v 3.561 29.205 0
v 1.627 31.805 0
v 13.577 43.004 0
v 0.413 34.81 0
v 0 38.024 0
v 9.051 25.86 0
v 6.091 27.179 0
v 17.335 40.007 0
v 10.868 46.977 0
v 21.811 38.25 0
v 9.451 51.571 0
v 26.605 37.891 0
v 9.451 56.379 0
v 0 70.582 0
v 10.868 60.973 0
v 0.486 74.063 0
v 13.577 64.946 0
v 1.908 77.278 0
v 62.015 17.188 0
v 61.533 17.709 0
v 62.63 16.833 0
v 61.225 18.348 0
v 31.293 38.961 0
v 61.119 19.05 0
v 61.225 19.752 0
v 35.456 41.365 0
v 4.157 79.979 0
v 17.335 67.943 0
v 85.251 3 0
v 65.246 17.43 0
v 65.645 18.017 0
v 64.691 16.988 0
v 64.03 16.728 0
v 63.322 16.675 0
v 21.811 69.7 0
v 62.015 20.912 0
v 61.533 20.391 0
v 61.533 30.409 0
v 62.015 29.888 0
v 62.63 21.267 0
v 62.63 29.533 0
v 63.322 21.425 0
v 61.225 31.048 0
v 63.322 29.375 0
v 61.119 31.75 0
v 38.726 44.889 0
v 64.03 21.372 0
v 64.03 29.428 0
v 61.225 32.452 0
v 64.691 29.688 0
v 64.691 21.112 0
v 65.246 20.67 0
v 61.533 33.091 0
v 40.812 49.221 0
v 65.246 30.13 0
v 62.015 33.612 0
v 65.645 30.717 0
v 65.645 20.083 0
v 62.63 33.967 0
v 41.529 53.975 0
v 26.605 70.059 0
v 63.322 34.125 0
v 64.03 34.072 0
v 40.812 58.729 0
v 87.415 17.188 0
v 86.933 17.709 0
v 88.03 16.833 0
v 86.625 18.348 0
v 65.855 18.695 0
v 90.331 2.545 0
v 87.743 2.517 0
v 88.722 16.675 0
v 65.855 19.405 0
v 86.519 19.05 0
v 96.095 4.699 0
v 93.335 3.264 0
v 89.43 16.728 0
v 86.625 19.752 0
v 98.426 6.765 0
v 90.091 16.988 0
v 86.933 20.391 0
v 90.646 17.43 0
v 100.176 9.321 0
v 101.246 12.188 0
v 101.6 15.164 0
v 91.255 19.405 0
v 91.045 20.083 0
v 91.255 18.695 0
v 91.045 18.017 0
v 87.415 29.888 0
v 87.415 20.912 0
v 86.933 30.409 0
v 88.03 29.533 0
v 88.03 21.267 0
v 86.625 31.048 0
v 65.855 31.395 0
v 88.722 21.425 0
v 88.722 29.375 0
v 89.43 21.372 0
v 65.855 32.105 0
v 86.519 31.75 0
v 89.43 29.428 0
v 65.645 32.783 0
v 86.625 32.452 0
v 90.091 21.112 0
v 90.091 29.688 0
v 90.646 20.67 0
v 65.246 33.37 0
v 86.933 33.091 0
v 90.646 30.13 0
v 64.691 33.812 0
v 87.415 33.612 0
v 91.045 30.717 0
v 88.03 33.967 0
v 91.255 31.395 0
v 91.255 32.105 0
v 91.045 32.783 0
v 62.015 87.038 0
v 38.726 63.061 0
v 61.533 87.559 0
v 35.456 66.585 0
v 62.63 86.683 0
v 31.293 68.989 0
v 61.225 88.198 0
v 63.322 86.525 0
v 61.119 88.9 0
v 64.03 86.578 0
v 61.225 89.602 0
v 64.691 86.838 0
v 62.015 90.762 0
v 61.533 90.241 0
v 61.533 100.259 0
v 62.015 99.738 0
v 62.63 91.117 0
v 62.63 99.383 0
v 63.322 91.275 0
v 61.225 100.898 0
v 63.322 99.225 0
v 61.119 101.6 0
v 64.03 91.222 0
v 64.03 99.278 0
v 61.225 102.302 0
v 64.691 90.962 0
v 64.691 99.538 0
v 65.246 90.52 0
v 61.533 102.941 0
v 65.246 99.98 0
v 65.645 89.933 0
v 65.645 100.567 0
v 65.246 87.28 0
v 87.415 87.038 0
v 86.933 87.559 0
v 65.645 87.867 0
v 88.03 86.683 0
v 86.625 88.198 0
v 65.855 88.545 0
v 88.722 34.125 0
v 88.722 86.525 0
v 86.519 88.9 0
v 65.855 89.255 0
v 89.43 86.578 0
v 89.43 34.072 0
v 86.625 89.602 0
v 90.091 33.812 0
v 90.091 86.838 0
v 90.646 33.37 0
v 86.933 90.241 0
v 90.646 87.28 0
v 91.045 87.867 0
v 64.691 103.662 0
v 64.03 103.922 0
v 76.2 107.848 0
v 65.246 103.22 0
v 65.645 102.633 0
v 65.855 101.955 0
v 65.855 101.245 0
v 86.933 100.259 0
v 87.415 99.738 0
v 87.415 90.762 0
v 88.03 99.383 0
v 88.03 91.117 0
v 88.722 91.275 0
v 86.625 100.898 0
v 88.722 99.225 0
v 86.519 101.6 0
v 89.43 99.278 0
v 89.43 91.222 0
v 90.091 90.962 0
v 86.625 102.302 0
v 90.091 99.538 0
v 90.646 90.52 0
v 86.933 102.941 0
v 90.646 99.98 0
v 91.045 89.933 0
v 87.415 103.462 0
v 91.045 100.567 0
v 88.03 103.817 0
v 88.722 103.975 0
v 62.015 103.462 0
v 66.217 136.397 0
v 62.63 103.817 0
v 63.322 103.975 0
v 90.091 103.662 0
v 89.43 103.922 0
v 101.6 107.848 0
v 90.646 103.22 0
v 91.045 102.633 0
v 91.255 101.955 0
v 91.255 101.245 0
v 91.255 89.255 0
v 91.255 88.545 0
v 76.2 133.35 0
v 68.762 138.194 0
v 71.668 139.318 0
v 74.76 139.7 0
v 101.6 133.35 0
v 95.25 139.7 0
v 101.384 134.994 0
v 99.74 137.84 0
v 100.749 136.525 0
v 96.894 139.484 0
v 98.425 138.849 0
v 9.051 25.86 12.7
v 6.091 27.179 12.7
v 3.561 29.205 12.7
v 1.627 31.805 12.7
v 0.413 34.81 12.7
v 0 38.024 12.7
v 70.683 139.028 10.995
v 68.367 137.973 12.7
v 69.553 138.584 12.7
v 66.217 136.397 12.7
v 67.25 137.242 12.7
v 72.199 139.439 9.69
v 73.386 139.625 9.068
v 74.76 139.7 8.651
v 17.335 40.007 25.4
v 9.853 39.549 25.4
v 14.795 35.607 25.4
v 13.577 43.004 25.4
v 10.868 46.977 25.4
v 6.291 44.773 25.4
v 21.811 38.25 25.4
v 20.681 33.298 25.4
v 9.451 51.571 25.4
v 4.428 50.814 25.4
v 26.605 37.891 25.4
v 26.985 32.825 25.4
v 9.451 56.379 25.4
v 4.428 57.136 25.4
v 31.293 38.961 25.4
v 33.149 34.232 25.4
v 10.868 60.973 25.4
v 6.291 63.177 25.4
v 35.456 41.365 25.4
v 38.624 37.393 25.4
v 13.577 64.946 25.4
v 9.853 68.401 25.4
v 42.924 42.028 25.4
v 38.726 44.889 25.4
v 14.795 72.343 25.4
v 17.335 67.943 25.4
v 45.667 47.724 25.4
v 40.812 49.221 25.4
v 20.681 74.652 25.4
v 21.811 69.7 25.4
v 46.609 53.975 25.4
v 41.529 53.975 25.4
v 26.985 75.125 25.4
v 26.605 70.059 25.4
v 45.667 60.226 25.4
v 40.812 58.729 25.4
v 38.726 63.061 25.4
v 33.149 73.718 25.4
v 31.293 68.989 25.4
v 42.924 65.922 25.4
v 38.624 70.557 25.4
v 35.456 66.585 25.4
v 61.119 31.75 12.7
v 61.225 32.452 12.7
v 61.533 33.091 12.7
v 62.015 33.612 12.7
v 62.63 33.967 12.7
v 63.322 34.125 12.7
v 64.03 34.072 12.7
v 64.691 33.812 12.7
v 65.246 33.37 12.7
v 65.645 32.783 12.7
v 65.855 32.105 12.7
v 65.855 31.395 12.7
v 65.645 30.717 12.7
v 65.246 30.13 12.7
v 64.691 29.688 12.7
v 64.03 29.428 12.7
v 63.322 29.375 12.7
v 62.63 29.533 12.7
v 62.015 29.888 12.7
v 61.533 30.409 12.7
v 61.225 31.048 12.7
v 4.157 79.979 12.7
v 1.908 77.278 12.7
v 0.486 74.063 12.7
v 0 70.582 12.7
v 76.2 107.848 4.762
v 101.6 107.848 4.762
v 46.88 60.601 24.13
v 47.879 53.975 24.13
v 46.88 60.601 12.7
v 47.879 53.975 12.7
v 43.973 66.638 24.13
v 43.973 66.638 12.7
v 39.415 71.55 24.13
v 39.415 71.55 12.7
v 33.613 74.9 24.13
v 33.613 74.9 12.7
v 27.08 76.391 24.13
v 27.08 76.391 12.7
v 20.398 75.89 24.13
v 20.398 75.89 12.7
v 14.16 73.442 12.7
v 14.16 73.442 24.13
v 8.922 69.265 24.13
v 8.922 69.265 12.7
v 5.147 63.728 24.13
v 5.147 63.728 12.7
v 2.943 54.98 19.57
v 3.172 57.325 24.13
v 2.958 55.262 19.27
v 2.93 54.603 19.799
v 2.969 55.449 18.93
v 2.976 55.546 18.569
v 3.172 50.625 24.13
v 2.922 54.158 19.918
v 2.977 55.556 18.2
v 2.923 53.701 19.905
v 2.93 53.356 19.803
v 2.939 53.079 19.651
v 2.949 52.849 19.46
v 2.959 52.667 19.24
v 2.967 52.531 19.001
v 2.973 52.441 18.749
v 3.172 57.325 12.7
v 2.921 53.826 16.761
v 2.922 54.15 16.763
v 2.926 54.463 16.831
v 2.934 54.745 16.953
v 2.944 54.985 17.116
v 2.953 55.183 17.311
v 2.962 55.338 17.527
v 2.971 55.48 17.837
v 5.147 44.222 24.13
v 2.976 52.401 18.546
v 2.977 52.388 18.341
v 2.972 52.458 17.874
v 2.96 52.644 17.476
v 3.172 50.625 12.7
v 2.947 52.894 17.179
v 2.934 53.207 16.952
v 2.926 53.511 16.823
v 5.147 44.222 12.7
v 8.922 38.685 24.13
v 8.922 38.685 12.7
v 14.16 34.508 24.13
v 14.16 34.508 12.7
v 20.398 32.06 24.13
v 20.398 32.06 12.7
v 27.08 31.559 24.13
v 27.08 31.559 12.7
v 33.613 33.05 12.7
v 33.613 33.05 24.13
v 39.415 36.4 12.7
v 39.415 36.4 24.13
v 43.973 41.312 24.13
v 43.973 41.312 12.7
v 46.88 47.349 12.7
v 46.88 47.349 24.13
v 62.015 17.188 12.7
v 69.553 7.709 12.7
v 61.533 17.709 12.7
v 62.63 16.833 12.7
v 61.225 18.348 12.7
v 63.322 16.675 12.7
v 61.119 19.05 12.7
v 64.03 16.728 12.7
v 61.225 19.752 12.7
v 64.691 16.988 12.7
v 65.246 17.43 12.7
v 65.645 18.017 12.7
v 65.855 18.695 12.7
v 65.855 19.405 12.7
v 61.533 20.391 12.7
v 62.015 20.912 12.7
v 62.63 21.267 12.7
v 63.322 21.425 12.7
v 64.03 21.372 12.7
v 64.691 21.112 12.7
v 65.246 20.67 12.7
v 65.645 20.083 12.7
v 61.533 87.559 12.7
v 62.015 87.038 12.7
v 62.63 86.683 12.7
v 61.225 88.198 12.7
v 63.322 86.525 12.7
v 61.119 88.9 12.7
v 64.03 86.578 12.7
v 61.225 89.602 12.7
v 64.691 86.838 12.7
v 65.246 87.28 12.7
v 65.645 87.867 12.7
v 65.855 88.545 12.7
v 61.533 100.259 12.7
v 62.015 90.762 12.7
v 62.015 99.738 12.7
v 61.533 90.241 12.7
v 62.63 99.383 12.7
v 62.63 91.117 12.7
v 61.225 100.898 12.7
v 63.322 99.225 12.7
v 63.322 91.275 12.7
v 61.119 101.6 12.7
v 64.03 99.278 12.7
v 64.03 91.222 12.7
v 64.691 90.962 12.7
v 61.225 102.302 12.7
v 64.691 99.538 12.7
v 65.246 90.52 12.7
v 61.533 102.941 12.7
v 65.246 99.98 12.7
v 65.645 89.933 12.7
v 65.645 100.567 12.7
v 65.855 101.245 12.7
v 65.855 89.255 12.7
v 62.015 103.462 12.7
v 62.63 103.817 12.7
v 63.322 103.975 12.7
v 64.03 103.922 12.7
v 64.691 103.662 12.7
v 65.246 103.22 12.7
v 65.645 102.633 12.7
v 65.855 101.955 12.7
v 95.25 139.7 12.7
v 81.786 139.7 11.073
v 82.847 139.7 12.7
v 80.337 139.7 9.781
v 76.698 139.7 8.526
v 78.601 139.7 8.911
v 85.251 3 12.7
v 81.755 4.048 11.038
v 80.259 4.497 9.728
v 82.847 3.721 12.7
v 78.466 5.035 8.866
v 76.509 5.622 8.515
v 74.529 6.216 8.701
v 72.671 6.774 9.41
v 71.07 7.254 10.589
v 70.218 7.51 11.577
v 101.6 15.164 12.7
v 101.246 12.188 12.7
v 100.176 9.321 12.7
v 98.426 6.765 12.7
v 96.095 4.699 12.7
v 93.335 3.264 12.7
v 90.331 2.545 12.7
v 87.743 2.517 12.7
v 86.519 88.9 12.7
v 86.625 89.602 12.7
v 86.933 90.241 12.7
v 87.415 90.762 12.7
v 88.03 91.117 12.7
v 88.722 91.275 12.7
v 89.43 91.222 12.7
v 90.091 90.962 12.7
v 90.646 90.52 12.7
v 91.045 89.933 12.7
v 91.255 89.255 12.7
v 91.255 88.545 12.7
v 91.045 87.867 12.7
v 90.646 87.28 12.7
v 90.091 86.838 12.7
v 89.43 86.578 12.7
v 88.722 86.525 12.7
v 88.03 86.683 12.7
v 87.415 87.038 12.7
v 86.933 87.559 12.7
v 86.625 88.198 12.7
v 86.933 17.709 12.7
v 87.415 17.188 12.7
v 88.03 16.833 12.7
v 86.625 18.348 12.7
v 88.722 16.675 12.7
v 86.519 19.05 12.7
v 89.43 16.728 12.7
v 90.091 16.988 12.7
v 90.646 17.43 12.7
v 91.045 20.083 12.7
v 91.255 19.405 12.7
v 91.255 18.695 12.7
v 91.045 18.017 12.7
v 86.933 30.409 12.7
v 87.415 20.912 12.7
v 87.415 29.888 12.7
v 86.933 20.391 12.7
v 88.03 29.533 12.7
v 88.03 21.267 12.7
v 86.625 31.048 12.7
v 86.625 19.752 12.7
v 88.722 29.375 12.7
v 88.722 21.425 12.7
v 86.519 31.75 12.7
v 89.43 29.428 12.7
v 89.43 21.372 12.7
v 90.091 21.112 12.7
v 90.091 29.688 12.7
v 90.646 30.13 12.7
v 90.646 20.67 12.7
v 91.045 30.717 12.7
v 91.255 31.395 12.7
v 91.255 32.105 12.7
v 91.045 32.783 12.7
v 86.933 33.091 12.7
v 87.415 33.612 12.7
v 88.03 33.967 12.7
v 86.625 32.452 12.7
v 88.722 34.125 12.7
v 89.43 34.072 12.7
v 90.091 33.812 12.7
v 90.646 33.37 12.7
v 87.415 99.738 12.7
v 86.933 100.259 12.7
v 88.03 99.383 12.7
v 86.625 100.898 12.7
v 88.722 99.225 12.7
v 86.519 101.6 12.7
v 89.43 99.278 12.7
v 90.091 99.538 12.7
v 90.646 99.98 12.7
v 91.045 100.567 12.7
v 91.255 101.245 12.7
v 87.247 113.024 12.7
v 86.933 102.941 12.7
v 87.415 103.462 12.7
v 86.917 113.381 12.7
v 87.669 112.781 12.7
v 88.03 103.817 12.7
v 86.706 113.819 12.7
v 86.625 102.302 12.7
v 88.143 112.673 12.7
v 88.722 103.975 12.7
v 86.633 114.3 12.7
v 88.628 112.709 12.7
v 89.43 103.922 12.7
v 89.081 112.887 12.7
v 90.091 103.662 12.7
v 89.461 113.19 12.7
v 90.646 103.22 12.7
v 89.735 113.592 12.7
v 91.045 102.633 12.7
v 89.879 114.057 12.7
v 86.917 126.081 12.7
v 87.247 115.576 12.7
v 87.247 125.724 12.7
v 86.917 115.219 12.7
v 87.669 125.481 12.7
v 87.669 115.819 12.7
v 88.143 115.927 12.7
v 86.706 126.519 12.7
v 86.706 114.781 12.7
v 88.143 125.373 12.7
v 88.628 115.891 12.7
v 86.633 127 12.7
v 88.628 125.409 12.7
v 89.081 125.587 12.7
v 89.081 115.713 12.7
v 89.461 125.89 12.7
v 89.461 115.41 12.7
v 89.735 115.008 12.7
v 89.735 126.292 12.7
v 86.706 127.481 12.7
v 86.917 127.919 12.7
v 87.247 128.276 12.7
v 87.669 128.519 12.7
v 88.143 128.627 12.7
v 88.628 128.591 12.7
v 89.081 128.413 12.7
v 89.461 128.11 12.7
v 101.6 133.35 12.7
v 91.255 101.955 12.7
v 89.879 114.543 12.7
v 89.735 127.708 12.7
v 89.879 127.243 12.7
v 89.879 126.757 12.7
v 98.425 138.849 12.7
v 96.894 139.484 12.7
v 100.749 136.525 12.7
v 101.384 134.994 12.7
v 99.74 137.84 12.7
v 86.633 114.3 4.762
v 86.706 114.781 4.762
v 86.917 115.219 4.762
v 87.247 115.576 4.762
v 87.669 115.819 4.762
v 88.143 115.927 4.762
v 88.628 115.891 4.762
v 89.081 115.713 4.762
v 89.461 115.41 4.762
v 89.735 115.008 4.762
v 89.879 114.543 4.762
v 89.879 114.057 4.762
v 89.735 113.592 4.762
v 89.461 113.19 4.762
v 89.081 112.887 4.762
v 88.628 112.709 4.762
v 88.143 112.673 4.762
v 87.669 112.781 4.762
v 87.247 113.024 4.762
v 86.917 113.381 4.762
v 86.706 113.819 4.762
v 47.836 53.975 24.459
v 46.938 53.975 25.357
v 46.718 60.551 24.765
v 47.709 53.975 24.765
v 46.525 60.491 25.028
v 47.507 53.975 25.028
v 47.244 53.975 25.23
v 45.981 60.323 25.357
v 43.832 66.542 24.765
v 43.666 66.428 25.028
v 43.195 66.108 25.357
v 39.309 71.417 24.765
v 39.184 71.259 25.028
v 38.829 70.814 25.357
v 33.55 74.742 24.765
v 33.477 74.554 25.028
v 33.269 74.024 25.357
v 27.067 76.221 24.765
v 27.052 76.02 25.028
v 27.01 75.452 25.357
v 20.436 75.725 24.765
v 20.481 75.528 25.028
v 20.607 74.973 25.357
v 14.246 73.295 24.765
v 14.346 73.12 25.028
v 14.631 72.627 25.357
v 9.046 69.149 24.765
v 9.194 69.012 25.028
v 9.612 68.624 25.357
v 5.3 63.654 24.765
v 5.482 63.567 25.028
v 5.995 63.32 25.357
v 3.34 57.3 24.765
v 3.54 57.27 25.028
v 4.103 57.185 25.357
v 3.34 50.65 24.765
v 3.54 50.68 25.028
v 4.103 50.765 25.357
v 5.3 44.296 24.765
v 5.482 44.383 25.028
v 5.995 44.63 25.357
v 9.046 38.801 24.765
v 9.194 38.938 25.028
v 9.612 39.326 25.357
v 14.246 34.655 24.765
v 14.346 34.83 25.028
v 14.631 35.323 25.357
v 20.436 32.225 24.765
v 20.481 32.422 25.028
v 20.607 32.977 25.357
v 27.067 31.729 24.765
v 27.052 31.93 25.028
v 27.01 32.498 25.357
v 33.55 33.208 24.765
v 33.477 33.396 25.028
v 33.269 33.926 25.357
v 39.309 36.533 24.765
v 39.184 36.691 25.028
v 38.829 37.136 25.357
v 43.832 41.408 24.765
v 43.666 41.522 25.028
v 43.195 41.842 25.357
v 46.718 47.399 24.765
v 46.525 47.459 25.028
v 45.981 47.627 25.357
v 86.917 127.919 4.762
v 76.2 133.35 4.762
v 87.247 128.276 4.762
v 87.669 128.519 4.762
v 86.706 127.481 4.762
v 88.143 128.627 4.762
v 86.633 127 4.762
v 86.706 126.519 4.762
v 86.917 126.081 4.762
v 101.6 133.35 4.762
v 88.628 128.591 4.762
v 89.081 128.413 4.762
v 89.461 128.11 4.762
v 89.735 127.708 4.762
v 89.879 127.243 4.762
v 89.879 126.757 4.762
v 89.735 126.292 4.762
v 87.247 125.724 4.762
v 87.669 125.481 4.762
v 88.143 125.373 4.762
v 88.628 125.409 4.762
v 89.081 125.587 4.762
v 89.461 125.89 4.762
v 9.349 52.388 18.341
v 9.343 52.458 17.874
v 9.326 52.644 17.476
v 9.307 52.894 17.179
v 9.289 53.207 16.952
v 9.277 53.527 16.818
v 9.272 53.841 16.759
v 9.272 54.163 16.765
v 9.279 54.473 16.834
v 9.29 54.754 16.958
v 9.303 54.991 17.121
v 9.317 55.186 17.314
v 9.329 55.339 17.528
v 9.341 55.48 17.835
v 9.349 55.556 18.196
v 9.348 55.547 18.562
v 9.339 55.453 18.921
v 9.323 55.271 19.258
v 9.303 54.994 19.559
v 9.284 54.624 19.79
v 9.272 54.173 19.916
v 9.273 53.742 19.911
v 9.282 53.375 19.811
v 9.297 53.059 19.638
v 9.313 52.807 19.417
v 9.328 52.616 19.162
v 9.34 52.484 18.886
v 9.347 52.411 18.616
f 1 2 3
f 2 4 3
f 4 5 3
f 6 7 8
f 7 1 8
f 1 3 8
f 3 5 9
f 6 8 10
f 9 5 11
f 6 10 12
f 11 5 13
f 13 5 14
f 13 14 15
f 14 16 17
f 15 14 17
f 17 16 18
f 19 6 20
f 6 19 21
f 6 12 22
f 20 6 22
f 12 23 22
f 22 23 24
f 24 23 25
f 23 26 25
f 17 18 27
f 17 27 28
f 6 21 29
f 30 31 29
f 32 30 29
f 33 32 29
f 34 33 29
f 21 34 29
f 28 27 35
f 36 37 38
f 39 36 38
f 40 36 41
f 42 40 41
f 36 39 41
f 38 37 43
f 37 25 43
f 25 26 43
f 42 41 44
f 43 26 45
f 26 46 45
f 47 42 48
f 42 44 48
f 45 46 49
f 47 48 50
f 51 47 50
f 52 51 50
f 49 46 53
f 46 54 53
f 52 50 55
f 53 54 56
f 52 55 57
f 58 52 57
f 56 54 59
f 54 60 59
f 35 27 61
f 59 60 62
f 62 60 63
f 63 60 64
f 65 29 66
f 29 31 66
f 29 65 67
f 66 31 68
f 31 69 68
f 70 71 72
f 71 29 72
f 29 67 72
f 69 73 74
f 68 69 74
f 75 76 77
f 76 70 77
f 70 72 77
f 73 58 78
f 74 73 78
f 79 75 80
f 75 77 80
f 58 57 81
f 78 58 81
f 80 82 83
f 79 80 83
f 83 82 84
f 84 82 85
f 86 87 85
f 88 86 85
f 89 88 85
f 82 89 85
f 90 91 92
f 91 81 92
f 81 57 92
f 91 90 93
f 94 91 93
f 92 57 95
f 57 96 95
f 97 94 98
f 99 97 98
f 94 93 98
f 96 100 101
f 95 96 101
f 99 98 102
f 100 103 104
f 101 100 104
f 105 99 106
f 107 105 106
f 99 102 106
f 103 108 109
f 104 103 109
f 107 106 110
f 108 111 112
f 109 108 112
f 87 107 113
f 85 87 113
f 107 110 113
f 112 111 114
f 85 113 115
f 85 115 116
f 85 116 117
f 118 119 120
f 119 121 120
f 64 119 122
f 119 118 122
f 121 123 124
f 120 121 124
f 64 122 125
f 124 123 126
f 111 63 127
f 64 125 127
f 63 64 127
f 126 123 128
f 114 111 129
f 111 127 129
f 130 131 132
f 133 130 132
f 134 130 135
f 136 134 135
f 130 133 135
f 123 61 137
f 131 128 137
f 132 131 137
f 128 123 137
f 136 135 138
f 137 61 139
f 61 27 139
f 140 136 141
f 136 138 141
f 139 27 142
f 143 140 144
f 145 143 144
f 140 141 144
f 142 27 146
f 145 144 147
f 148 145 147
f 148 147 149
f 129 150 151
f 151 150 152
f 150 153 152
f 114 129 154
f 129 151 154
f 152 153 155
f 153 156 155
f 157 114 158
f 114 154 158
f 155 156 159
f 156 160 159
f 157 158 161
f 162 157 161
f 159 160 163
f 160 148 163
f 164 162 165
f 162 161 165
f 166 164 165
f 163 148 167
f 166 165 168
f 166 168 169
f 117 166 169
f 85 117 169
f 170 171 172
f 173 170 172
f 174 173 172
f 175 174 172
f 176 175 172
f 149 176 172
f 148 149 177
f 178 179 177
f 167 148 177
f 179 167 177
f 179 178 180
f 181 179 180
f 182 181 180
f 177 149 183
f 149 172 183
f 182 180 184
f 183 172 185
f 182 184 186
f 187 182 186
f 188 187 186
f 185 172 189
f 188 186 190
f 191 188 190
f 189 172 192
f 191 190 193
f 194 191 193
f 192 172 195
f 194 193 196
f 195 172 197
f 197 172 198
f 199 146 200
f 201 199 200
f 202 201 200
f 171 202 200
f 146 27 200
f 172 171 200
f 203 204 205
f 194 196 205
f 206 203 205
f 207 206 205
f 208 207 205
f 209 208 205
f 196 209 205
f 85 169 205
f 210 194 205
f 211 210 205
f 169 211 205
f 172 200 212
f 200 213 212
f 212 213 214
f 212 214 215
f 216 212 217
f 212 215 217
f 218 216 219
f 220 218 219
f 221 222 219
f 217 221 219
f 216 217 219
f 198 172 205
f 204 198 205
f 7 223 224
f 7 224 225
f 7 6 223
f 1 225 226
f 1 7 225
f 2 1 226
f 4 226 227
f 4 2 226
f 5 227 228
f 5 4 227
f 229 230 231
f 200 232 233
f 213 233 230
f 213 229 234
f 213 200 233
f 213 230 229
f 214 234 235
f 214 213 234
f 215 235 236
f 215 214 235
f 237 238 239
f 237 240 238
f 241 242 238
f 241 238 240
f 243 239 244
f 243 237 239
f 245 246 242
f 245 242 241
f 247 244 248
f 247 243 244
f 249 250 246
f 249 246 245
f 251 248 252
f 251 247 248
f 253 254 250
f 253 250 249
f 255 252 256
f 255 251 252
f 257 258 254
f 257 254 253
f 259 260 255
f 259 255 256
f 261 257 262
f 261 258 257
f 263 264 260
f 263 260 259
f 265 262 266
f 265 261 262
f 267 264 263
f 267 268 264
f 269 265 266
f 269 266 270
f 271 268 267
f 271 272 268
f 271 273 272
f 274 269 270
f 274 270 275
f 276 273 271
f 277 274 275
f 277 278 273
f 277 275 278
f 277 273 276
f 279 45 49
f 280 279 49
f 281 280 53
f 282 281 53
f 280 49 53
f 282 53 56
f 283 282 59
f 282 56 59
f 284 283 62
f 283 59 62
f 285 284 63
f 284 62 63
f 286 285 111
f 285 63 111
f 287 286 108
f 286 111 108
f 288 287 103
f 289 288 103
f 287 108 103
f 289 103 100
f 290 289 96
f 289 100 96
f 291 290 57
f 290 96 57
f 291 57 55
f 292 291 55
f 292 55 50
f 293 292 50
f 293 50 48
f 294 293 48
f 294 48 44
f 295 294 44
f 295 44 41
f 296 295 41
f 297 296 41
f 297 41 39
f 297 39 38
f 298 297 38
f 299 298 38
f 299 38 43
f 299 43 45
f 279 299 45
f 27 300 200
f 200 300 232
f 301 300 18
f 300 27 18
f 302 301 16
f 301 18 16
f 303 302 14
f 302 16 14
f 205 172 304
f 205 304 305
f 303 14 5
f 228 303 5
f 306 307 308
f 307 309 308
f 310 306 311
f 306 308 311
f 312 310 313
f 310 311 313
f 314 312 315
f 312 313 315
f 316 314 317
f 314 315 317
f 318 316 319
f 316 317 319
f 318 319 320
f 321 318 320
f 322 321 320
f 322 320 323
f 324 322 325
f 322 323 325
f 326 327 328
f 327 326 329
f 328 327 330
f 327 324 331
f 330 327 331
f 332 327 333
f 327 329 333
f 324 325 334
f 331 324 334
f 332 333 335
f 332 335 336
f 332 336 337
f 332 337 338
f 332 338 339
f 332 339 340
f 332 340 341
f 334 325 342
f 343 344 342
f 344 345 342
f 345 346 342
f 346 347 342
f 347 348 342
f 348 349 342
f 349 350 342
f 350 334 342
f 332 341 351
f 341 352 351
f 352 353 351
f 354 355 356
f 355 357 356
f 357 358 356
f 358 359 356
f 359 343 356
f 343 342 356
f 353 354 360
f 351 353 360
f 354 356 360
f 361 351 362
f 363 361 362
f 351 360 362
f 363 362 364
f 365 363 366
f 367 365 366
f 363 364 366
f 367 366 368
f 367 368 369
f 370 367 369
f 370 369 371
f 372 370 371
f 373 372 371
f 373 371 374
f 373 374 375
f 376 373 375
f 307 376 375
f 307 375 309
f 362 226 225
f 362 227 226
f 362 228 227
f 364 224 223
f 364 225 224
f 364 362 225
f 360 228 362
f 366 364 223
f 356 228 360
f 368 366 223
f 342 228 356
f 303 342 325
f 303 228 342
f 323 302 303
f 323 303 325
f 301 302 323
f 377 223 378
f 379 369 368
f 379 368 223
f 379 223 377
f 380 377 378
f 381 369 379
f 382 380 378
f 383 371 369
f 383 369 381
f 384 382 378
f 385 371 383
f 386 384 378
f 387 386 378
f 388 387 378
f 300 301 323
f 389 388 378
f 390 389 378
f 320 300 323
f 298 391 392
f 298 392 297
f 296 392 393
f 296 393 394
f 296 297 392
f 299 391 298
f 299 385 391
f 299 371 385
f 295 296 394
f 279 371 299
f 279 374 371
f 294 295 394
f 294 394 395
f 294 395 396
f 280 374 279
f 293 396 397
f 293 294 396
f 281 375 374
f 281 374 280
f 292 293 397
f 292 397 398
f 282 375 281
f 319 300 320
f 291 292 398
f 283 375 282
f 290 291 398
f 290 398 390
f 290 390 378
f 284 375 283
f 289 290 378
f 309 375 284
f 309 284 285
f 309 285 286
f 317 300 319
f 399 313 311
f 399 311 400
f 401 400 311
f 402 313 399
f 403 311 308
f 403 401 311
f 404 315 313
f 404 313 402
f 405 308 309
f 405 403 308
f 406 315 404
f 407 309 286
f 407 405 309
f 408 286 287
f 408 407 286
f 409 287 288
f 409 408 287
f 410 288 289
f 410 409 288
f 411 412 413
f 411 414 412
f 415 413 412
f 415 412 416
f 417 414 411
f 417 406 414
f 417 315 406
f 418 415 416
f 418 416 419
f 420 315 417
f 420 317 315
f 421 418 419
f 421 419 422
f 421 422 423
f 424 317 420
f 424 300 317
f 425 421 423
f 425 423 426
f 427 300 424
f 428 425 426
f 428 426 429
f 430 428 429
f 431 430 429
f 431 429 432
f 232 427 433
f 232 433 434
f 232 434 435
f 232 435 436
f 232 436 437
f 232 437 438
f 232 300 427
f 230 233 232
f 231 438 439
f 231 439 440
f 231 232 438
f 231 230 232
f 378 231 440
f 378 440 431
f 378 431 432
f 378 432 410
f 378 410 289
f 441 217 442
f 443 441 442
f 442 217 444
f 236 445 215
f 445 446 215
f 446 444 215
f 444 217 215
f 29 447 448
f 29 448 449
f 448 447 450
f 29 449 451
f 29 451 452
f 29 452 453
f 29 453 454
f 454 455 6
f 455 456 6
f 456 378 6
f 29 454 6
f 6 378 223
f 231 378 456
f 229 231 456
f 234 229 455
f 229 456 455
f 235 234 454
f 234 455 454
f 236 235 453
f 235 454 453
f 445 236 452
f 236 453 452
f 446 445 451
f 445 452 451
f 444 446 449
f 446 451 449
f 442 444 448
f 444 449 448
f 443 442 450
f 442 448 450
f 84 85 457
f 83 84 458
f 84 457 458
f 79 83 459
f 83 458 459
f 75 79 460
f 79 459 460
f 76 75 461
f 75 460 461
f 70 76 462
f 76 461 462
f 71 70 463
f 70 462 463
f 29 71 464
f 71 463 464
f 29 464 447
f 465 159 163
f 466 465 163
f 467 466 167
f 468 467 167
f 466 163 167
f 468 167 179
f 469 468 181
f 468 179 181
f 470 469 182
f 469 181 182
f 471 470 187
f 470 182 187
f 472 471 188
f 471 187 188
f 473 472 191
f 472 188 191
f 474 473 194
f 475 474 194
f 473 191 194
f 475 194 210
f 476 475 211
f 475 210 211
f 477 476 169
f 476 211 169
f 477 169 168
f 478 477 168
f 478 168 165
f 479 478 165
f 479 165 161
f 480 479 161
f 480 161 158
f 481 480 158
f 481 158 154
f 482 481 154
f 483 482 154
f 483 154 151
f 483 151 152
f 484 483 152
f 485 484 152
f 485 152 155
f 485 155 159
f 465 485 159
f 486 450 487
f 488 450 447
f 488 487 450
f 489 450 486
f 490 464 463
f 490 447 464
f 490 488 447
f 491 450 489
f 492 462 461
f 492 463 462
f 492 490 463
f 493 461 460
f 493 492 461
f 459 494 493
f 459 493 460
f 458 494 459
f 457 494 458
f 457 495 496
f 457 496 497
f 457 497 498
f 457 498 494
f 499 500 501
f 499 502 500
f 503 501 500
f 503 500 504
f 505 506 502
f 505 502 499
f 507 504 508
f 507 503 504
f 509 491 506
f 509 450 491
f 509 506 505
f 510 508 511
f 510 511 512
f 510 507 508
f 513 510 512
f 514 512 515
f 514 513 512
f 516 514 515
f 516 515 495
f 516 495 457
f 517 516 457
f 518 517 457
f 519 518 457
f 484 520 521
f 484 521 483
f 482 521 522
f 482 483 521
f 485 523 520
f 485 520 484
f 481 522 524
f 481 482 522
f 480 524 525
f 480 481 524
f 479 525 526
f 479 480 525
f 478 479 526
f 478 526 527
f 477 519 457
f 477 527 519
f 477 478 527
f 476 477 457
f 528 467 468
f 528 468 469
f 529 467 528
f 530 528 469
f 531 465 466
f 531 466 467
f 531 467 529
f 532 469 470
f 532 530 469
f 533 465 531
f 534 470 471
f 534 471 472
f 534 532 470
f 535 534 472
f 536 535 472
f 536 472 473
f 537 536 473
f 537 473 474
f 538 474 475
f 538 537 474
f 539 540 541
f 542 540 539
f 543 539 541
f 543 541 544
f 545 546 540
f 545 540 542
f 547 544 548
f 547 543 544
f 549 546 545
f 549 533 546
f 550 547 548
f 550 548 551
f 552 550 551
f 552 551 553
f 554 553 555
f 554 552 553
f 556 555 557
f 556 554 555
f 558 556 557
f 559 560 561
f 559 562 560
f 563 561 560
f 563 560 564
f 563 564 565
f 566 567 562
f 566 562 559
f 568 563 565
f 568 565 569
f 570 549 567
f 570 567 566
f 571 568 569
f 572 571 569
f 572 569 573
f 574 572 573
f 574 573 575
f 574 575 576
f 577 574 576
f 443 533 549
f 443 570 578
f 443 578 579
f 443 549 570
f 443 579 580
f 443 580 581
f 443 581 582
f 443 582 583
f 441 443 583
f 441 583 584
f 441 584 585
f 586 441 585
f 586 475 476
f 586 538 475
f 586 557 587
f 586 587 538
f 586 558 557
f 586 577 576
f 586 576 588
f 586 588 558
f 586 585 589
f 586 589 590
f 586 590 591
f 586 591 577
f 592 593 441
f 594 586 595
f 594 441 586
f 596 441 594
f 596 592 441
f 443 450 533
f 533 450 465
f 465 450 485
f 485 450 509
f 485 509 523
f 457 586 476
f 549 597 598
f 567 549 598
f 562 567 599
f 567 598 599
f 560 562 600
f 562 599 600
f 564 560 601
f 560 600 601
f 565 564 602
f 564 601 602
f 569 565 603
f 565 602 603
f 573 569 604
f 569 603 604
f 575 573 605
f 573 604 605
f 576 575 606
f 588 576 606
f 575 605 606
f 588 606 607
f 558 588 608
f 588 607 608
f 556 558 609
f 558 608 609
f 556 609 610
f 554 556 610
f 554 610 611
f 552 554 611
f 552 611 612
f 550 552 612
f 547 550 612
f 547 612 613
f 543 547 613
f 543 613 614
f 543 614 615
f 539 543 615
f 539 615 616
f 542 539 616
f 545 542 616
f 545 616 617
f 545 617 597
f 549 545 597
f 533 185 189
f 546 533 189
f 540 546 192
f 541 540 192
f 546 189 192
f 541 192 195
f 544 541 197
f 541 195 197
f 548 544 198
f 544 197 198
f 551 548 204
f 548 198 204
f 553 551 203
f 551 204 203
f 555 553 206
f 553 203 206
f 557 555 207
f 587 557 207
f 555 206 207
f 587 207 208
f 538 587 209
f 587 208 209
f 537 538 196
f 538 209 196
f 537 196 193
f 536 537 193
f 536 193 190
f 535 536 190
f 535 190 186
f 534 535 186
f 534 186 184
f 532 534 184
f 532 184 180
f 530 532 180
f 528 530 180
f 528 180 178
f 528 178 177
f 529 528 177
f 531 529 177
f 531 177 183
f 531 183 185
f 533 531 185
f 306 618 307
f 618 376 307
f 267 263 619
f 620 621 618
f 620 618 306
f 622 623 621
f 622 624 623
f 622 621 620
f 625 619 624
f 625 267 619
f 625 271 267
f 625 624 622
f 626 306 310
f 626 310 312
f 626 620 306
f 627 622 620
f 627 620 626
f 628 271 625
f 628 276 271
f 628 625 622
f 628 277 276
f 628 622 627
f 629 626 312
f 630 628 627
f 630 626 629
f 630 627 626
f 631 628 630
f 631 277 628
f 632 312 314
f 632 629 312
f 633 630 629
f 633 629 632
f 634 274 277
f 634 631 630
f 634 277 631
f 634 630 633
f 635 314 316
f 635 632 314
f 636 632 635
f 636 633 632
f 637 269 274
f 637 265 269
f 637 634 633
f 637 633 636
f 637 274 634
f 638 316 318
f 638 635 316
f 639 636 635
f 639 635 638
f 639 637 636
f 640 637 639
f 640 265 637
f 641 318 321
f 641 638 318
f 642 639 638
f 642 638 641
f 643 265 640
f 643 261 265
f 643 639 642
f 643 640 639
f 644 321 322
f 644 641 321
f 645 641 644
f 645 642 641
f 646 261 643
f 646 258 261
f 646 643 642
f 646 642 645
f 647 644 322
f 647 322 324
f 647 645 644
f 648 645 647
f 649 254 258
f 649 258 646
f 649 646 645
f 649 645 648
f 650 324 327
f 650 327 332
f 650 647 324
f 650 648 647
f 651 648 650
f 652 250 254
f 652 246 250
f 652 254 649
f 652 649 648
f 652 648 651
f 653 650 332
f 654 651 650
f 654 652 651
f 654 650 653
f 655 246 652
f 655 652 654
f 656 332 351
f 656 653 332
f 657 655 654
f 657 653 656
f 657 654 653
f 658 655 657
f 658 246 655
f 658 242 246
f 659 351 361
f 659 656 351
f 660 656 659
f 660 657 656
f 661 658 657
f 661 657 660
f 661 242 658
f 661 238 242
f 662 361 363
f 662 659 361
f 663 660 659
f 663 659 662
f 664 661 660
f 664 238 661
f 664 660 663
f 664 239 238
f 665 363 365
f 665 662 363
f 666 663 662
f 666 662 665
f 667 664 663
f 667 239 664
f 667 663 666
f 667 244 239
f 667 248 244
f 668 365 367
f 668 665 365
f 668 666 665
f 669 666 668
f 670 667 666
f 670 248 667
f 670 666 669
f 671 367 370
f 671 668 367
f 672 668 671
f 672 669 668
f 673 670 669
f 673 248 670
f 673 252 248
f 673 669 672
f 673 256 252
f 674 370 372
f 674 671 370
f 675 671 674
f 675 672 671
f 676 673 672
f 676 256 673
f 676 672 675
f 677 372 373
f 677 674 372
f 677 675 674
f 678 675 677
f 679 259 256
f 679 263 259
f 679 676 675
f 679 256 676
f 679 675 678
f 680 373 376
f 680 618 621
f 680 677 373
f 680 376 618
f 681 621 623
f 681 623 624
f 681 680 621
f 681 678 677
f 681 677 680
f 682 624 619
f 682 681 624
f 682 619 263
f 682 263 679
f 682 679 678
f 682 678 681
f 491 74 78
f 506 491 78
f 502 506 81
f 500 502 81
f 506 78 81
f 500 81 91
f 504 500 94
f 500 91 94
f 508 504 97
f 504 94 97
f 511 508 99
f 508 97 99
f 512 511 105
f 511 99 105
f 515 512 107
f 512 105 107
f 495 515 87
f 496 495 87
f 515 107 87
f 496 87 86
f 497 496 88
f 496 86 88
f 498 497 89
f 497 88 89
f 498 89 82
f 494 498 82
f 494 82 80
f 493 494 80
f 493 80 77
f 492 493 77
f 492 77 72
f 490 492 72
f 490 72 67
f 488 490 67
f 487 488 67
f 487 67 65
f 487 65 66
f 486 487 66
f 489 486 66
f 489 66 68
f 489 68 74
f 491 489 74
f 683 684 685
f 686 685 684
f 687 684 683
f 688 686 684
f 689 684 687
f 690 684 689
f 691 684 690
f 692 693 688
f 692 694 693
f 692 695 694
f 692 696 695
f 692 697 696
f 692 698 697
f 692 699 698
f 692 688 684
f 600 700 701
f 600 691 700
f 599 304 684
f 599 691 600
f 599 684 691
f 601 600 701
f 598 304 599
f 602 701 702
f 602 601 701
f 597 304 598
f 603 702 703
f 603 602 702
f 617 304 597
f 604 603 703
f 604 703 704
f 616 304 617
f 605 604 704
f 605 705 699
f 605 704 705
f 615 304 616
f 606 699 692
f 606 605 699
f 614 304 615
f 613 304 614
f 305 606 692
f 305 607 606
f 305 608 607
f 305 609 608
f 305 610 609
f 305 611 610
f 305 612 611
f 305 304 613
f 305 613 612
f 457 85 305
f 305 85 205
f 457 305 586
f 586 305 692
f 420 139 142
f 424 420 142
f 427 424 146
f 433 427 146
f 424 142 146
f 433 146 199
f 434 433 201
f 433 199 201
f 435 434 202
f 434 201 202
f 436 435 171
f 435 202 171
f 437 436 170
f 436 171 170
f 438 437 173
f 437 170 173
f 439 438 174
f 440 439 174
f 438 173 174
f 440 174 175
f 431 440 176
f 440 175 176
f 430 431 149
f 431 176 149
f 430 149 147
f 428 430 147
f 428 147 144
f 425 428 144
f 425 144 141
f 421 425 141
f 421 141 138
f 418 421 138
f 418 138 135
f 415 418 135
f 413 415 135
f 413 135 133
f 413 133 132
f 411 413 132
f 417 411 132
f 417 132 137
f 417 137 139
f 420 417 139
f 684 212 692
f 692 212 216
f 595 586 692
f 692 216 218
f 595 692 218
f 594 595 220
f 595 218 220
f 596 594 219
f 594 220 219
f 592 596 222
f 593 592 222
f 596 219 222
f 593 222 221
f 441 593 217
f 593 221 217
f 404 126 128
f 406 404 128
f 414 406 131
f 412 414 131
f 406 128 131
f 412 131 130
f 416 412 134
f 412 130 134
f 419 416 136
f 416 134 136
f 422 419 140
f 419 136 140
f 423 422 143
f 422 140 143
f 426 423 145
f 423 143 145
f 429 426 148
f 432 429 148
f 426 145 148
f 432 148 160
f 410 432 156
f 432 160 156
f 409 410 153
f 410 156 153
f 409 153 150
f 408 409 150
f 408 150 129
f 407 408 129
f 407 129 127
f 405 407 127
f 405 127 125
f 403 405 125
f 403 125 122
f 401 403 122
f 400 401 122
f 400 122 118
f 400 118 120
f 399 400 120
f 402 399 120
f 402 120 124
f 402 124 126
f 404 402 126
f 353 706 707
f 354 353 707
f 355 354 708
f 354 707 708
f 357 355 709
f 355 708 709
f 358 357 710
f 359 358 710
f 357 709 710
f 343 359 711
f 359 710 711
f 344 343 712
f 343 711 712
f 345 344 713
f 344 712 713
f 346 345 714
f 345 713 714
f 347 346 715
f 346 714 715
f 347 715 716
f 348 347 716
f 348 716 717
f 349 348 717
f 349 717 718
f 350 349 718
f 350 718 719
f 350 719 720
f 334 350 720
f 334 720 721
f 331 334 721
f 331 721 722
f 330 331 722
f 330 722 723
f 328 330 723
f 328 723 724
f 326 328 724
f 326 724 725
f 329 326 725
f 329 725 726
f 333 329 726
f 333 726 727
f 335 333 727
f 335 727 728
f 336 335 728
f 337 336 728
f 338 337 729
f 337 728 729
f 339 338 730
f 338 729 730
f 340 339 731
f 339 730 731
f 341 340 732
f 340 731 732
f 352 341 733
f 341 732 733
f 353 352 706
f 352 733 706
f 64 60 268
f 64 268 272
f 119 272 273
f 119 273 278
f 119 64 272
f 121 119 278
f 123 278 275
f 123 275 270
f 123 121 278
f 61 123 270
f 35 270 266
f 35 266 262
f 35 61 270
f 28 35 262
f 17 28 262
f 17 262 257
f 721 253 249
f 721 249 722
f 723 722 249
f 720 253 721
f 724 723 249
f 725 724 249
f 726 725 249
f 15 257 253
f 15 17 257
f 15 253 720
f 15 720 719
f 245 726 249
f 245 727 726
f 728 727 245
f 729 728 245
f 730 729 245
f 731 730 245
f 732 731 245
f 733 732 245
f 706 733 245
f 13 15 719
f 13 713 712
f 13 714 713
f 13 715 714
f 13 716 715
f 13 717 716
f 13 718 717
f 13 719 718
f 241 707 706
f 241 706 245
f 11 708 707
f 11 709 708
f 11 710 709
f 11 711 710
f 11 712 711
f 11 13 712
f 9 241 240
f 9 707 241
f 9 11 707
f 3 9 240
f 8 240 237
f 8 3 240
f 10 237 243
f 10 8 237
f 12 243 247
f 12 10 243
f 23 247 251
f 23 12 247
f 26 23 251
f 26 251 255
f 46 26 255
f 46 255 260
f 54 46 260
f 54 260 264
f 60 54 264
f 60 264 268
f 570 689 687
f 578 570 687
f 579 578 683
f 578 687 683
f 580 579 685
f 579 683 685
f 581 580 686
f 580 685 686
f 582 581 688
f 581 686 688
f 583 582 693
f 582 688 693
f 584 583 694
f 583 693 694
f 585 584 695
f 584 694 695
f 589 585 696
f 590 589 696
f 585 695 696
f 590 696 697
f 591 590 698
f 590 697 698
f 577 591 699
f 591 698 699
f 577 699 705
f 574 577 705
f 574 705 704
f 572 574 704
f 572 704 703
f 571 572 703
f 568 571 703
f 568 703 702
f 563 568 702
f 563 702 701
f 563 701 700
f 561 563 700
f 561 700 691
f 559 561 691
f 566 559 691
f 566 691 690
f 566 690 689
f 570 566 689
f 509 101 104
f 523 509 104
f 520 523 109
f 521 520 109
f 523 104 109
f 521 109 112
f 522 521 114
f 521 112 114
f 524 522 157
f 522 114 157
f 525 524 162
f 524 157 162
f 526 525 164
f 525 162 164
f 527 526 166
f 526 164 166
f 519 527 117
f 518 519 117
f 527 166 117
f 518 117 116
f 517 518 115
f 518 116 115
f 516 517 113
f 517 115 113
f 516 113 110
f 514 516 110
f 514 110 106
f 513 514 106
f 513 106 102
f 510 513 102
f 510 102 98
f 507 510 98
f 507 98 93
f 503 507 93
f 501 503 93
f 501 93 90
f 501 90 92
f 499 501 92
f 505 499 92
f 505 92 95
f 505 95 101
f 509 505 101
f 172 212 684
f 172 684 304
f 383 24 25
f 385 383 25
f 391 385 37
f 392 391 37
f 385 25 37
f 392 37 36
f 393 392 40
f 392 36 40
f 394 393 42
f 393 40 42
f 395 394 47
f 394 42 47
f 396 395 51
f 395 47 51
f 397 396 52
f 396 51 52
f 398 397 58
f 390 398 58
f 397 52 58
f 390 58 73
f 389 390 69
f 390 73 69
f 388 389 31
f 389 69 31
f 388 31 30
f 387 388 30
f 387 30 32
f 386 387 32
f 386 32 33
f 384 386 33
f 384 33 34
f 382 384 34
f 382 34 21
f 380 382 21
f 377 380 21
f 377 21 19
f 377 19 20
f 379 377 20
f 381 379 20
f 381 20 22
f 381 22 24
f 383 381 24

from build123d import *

# Parameters (mm, degrees)
F0_R      = 16.129
F1_DEPTH  = 12.7
F2_R      = 22.479
F2_R_2    = 16.129
F3_DEPTH  = 12.7
F5_D      = 3.2639
F5_DEPTH  = 19.05
F5_TIP    = 0.9805744872
F7_DEPTH  = 12.7
F8_R      = 12.7
F9_R      = 7.366
F10_DEPTH = 152.4
F11_R     = 1.27
F13_D     = 3.175
F13_DEPTH = 12.7
F13_TIP   = 0.9538662327
F15_D     = 4.7625
F15_DEPTH = 19.05
F15_TIP   = 1.4307993491
F16_W     = 25.4
F16_H     = 25.5016
F17_DEPTH = 4.7625


with BuildPart() as f1:
    # F0 (on Top) → F1 (new body)
    with BuildSketch(Plane.XY):
        with BuildLine():
            Line((0, 133.35), (0, 0))
            Line((0, 0), (95.25, 0))
            ThreePointArc((95.25, 0), (99.7401280605, 1.8598719395), (101.6, 6.35))
            Line((101.6, 6.35), (101.6, 133.35))
            ThreePointArc((101.6, 133.35), (99.7401280605, 137.8401280605), (95.25, 139.7))
            Line((95.25, 139.7), (6.35, 139.7))
            ThreePointArc((6.35, 139.7), (1.8598719395, 137.8401280605), (0, 133.35))
        make_face()
        with Locations((25.4, 53.975)):
            Circle(F0_R, mode=Mode.SUBTRACT)
    extrude(amount=F1_DEPTH)

    # F2 (on face) → F3 (join)
    with BuildSketch(Plane.XY.offset(12.7)):
        with Locations((25.4, 53.975)):
            Circle(F2_R)
        with Locations((25.4, 53.975)):
            Circle(F2_R_2, mode=Mode.SUBTRACT)
    extrude(amount=F3_DEPTH)

    # F5
    with Locations(Plane.XY.offset(12.7)):
        with Locations((88.265, 127), (88.265, 114.3)):
            Hole(F5_D / 2, depth=F5_DEPTH)
            with Locations((0, 0, -(F5_DEPTH + F5_TIP / 2))):  # 118° drill point
                Cone(0, F5_D / 2, F5_TIP, mode=Mode.SUBTRACT)

    # F6 (on face) → F7 (cut, through all)
    with BuildSketch(Plane.XY.offset(12.7)):
        Polygon((95.25, 0), (0, 28.575), (0, 0), align=None)
        Polygon((0, 139.7), (0, 76.2), (69.85, 139.7), align=None)
    extrude(amount=-F7_DEPTH, mode=Mode.SUBTRACT)

    # F8
    f8_edges = [f1.edges().sort_by_distance(p)[0] for p in [
        (0, 28.575, 6.35),
        (0, 76.2, 6.35),
        (69.85, 139.7, 6.35),
        (95.25, 0, 6.35),
    ]]
    fillet(f8_edges, radius=F8_R)

    # F9 (on Front) → F10 (cut)
    with BuildSketch(Plane.XZ):
        with Locations((76.2, 15.875)):
            Circle(F9_R)
    extrude(amount=-F10_DEPTH, mode=Mode.SUBTRACT)

    # F11
    f11_edges = [f1.edges().sort_by_distance(p)[0] for p in [
        (2.921, 53.975, 25.4),
    ]]
    fillet(f11_edges, radius=F11_R)

    # F13
    with Locations(Plane(origin=(0, 0, 0), x_dir=(0, 1, 0), z_dir=(-1, 0, 0))):
        with Locations((53.975, -18.3411143556)):
            Hole(F13_D / 2, depth=F13_DEPTH)
            with Locations((0, 0, -(F13_DEPTH + F13_TIP / 2))):  # 118° drill point
                Cone(0, F13_D / 2, F13_TIP, mode=Mode.SUBTRACT)

    # F15
    with Locations(Plane.XY.offset(12.7)):
        with Locations((88.9, 101.6), (88.9, 88.9), (63.5, 101.6), (63.5, 88.9), (63.5, 31.75), (63.5, 19.05), (88.9, 19.05), (88.9, 31.75)):
            Hole(F15_D / 2, depth=F15_DEPTH)
            with Locations((0, 0, -(F15_DEPTH + F15_TIP / 2))):  # 118° drill point
                Cone(0, F15_D / 2, F15_TIP, mode=Mode.SUBTRACT)

    # F16 (on face) → F17 (cut)
    with BuildSketch(Plane(origin=(0, 0, 0), x_dir=(1, 0, 0), z_dir=(0, 0, -1))):
        with Locations((88.9, -120.5992)):
            Rectangle(F16_W, F16_H)
    extrude(amount=-F17_DEPTH, mode=Mode.SUBTRACT)


solid = f1.part
